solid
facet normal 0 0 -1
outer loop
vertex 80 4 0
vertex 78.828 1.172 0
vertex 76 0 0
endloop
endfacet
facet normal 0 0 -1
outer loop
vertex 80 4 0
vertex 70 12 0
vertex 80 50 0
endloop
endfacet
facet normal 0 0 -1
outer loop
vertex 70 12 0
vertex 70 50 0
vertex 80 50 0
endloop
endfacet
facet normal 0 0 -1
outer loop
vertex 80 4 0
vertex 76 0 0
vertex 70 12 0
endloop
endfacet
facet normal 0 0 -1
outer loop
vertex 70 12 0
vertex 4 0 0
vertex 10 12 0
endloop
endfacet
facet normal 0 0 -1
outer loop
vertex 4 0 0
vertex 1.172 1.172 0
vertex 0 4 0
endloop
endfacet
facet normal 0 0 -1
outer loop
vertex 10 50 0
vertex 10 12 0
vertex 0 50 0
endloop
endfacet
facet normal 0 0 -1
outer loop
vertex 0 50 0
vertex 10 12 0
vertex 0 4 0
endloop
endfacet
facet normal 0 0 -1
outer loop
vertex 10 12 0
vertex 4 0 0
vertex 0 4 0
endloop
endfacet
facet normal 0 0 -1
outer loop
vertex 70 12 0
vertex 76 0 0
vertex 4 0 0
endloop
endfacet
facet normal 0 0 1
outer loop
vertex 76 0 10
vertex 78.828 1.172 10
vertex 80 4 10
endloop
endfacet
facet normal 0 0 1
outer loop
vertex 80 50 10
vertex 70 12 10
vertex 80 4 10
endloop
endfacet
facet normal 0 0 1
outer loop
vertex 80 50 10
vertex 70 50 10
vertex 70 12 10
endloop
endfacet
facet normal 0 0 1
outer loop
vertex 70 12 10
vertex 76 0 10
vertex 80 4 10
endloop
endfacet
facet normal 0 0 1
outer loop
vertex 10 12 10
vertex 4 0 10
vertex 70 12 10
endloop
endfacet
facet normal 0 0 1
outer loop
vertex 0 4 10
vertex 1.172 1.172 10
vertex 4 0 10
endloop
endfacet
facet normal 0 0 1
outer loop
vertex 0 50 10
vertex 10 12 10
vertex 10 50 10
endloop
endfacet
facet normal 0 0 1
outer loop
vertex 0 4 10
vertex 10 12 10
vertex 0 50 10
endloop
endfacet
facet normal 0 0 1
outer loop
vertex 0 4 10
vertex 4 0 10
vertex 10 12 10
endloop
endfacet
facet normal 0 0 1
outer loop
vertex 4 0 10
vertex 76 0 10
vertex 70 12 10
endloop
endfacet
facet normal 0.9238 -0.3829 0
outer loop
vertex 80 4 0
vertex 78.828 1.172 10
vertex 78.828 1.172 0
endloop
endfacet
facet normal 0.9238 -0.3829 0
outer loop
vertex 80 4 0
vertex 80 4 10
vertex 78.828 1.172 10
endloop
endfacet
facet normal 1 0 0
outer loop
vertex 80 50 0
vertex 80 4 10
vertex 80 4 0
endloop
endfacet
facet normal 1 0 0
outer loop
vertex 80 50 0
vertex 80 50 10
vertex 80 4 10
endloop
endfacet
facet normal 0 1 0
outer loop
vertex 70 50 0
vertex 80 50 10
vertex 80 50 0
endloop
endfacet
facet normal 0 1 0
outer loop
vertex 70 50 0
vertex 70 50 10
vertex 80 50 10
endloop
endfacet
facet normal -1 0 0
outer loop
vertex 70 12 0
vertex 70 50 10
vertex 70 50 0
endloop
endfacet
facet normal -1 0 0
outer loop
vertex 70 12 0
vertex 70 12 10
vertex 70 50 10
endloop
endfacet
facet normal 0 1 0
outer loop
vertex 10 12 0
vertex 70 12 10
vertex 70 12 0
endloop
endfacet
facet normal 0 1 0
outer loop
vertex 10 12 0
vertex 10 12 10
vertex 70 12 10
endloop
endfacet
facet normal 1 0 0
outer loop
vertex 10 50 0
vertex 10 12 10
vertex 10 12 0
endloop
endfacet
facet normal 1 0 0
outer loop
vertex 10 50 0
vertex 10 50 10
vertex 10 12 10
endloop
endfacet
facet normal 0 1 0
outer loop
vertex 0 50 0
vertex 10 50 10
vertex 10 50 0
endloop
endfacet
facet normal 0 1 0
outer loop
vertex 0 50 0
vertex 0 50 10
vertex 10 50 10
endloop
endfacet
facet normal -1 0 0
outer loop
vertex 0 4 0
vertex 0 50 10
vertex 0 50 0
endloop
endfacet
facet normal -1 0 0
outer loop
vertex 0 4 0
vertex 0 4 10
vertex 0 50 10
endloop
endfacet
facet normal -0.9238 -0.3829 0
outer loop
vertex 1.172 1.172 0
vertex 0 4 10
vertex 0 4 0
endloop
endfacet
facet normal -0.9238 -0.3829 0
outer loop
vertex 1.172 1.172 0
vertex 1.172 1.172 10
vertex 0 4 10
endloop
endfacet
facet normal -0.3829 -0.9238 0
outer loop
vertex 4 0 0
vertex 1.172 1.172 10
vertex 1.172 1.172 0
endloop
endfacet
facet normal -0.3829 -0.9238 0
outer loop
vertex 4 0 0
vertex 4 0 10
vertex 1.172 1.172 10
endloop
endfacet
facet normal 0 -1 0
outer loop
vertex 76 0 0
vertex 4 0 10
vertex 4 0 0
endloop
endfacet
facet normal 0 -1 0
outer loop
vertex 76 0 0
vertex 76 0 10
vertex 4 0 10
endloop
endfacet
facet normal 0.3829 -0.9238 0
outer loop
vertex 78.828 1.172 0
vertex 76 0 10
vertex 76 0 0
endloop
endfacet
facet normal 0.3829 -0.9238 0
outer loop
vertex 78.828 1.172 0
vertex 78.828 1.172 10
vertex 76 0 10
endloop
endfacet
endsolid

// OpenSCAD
$fn = 32;

// ----------------------------------------------------------------------
// Heat sink frame: 80 x 50 mm frame, 10 mm walls
// ----------------------------------------------------------------------

// --- parameters (mm) ---
profile_height = 10;      // extrusion height
profile_points = 12;      // points of the closed outline

profile = [[0, 4], [1.172, 1.172], [4, 0], [76, 0], [78.828, 1.172], [80, 4], [80, 50], [70, 50], [70, 12], [10, 12], [10, 50], [0, 50]];  // single closed polygon, 12 points, counter clockwise

// --- the one profile operation ---
linear_extrude(height = profile_height) polygon(points = profile);
